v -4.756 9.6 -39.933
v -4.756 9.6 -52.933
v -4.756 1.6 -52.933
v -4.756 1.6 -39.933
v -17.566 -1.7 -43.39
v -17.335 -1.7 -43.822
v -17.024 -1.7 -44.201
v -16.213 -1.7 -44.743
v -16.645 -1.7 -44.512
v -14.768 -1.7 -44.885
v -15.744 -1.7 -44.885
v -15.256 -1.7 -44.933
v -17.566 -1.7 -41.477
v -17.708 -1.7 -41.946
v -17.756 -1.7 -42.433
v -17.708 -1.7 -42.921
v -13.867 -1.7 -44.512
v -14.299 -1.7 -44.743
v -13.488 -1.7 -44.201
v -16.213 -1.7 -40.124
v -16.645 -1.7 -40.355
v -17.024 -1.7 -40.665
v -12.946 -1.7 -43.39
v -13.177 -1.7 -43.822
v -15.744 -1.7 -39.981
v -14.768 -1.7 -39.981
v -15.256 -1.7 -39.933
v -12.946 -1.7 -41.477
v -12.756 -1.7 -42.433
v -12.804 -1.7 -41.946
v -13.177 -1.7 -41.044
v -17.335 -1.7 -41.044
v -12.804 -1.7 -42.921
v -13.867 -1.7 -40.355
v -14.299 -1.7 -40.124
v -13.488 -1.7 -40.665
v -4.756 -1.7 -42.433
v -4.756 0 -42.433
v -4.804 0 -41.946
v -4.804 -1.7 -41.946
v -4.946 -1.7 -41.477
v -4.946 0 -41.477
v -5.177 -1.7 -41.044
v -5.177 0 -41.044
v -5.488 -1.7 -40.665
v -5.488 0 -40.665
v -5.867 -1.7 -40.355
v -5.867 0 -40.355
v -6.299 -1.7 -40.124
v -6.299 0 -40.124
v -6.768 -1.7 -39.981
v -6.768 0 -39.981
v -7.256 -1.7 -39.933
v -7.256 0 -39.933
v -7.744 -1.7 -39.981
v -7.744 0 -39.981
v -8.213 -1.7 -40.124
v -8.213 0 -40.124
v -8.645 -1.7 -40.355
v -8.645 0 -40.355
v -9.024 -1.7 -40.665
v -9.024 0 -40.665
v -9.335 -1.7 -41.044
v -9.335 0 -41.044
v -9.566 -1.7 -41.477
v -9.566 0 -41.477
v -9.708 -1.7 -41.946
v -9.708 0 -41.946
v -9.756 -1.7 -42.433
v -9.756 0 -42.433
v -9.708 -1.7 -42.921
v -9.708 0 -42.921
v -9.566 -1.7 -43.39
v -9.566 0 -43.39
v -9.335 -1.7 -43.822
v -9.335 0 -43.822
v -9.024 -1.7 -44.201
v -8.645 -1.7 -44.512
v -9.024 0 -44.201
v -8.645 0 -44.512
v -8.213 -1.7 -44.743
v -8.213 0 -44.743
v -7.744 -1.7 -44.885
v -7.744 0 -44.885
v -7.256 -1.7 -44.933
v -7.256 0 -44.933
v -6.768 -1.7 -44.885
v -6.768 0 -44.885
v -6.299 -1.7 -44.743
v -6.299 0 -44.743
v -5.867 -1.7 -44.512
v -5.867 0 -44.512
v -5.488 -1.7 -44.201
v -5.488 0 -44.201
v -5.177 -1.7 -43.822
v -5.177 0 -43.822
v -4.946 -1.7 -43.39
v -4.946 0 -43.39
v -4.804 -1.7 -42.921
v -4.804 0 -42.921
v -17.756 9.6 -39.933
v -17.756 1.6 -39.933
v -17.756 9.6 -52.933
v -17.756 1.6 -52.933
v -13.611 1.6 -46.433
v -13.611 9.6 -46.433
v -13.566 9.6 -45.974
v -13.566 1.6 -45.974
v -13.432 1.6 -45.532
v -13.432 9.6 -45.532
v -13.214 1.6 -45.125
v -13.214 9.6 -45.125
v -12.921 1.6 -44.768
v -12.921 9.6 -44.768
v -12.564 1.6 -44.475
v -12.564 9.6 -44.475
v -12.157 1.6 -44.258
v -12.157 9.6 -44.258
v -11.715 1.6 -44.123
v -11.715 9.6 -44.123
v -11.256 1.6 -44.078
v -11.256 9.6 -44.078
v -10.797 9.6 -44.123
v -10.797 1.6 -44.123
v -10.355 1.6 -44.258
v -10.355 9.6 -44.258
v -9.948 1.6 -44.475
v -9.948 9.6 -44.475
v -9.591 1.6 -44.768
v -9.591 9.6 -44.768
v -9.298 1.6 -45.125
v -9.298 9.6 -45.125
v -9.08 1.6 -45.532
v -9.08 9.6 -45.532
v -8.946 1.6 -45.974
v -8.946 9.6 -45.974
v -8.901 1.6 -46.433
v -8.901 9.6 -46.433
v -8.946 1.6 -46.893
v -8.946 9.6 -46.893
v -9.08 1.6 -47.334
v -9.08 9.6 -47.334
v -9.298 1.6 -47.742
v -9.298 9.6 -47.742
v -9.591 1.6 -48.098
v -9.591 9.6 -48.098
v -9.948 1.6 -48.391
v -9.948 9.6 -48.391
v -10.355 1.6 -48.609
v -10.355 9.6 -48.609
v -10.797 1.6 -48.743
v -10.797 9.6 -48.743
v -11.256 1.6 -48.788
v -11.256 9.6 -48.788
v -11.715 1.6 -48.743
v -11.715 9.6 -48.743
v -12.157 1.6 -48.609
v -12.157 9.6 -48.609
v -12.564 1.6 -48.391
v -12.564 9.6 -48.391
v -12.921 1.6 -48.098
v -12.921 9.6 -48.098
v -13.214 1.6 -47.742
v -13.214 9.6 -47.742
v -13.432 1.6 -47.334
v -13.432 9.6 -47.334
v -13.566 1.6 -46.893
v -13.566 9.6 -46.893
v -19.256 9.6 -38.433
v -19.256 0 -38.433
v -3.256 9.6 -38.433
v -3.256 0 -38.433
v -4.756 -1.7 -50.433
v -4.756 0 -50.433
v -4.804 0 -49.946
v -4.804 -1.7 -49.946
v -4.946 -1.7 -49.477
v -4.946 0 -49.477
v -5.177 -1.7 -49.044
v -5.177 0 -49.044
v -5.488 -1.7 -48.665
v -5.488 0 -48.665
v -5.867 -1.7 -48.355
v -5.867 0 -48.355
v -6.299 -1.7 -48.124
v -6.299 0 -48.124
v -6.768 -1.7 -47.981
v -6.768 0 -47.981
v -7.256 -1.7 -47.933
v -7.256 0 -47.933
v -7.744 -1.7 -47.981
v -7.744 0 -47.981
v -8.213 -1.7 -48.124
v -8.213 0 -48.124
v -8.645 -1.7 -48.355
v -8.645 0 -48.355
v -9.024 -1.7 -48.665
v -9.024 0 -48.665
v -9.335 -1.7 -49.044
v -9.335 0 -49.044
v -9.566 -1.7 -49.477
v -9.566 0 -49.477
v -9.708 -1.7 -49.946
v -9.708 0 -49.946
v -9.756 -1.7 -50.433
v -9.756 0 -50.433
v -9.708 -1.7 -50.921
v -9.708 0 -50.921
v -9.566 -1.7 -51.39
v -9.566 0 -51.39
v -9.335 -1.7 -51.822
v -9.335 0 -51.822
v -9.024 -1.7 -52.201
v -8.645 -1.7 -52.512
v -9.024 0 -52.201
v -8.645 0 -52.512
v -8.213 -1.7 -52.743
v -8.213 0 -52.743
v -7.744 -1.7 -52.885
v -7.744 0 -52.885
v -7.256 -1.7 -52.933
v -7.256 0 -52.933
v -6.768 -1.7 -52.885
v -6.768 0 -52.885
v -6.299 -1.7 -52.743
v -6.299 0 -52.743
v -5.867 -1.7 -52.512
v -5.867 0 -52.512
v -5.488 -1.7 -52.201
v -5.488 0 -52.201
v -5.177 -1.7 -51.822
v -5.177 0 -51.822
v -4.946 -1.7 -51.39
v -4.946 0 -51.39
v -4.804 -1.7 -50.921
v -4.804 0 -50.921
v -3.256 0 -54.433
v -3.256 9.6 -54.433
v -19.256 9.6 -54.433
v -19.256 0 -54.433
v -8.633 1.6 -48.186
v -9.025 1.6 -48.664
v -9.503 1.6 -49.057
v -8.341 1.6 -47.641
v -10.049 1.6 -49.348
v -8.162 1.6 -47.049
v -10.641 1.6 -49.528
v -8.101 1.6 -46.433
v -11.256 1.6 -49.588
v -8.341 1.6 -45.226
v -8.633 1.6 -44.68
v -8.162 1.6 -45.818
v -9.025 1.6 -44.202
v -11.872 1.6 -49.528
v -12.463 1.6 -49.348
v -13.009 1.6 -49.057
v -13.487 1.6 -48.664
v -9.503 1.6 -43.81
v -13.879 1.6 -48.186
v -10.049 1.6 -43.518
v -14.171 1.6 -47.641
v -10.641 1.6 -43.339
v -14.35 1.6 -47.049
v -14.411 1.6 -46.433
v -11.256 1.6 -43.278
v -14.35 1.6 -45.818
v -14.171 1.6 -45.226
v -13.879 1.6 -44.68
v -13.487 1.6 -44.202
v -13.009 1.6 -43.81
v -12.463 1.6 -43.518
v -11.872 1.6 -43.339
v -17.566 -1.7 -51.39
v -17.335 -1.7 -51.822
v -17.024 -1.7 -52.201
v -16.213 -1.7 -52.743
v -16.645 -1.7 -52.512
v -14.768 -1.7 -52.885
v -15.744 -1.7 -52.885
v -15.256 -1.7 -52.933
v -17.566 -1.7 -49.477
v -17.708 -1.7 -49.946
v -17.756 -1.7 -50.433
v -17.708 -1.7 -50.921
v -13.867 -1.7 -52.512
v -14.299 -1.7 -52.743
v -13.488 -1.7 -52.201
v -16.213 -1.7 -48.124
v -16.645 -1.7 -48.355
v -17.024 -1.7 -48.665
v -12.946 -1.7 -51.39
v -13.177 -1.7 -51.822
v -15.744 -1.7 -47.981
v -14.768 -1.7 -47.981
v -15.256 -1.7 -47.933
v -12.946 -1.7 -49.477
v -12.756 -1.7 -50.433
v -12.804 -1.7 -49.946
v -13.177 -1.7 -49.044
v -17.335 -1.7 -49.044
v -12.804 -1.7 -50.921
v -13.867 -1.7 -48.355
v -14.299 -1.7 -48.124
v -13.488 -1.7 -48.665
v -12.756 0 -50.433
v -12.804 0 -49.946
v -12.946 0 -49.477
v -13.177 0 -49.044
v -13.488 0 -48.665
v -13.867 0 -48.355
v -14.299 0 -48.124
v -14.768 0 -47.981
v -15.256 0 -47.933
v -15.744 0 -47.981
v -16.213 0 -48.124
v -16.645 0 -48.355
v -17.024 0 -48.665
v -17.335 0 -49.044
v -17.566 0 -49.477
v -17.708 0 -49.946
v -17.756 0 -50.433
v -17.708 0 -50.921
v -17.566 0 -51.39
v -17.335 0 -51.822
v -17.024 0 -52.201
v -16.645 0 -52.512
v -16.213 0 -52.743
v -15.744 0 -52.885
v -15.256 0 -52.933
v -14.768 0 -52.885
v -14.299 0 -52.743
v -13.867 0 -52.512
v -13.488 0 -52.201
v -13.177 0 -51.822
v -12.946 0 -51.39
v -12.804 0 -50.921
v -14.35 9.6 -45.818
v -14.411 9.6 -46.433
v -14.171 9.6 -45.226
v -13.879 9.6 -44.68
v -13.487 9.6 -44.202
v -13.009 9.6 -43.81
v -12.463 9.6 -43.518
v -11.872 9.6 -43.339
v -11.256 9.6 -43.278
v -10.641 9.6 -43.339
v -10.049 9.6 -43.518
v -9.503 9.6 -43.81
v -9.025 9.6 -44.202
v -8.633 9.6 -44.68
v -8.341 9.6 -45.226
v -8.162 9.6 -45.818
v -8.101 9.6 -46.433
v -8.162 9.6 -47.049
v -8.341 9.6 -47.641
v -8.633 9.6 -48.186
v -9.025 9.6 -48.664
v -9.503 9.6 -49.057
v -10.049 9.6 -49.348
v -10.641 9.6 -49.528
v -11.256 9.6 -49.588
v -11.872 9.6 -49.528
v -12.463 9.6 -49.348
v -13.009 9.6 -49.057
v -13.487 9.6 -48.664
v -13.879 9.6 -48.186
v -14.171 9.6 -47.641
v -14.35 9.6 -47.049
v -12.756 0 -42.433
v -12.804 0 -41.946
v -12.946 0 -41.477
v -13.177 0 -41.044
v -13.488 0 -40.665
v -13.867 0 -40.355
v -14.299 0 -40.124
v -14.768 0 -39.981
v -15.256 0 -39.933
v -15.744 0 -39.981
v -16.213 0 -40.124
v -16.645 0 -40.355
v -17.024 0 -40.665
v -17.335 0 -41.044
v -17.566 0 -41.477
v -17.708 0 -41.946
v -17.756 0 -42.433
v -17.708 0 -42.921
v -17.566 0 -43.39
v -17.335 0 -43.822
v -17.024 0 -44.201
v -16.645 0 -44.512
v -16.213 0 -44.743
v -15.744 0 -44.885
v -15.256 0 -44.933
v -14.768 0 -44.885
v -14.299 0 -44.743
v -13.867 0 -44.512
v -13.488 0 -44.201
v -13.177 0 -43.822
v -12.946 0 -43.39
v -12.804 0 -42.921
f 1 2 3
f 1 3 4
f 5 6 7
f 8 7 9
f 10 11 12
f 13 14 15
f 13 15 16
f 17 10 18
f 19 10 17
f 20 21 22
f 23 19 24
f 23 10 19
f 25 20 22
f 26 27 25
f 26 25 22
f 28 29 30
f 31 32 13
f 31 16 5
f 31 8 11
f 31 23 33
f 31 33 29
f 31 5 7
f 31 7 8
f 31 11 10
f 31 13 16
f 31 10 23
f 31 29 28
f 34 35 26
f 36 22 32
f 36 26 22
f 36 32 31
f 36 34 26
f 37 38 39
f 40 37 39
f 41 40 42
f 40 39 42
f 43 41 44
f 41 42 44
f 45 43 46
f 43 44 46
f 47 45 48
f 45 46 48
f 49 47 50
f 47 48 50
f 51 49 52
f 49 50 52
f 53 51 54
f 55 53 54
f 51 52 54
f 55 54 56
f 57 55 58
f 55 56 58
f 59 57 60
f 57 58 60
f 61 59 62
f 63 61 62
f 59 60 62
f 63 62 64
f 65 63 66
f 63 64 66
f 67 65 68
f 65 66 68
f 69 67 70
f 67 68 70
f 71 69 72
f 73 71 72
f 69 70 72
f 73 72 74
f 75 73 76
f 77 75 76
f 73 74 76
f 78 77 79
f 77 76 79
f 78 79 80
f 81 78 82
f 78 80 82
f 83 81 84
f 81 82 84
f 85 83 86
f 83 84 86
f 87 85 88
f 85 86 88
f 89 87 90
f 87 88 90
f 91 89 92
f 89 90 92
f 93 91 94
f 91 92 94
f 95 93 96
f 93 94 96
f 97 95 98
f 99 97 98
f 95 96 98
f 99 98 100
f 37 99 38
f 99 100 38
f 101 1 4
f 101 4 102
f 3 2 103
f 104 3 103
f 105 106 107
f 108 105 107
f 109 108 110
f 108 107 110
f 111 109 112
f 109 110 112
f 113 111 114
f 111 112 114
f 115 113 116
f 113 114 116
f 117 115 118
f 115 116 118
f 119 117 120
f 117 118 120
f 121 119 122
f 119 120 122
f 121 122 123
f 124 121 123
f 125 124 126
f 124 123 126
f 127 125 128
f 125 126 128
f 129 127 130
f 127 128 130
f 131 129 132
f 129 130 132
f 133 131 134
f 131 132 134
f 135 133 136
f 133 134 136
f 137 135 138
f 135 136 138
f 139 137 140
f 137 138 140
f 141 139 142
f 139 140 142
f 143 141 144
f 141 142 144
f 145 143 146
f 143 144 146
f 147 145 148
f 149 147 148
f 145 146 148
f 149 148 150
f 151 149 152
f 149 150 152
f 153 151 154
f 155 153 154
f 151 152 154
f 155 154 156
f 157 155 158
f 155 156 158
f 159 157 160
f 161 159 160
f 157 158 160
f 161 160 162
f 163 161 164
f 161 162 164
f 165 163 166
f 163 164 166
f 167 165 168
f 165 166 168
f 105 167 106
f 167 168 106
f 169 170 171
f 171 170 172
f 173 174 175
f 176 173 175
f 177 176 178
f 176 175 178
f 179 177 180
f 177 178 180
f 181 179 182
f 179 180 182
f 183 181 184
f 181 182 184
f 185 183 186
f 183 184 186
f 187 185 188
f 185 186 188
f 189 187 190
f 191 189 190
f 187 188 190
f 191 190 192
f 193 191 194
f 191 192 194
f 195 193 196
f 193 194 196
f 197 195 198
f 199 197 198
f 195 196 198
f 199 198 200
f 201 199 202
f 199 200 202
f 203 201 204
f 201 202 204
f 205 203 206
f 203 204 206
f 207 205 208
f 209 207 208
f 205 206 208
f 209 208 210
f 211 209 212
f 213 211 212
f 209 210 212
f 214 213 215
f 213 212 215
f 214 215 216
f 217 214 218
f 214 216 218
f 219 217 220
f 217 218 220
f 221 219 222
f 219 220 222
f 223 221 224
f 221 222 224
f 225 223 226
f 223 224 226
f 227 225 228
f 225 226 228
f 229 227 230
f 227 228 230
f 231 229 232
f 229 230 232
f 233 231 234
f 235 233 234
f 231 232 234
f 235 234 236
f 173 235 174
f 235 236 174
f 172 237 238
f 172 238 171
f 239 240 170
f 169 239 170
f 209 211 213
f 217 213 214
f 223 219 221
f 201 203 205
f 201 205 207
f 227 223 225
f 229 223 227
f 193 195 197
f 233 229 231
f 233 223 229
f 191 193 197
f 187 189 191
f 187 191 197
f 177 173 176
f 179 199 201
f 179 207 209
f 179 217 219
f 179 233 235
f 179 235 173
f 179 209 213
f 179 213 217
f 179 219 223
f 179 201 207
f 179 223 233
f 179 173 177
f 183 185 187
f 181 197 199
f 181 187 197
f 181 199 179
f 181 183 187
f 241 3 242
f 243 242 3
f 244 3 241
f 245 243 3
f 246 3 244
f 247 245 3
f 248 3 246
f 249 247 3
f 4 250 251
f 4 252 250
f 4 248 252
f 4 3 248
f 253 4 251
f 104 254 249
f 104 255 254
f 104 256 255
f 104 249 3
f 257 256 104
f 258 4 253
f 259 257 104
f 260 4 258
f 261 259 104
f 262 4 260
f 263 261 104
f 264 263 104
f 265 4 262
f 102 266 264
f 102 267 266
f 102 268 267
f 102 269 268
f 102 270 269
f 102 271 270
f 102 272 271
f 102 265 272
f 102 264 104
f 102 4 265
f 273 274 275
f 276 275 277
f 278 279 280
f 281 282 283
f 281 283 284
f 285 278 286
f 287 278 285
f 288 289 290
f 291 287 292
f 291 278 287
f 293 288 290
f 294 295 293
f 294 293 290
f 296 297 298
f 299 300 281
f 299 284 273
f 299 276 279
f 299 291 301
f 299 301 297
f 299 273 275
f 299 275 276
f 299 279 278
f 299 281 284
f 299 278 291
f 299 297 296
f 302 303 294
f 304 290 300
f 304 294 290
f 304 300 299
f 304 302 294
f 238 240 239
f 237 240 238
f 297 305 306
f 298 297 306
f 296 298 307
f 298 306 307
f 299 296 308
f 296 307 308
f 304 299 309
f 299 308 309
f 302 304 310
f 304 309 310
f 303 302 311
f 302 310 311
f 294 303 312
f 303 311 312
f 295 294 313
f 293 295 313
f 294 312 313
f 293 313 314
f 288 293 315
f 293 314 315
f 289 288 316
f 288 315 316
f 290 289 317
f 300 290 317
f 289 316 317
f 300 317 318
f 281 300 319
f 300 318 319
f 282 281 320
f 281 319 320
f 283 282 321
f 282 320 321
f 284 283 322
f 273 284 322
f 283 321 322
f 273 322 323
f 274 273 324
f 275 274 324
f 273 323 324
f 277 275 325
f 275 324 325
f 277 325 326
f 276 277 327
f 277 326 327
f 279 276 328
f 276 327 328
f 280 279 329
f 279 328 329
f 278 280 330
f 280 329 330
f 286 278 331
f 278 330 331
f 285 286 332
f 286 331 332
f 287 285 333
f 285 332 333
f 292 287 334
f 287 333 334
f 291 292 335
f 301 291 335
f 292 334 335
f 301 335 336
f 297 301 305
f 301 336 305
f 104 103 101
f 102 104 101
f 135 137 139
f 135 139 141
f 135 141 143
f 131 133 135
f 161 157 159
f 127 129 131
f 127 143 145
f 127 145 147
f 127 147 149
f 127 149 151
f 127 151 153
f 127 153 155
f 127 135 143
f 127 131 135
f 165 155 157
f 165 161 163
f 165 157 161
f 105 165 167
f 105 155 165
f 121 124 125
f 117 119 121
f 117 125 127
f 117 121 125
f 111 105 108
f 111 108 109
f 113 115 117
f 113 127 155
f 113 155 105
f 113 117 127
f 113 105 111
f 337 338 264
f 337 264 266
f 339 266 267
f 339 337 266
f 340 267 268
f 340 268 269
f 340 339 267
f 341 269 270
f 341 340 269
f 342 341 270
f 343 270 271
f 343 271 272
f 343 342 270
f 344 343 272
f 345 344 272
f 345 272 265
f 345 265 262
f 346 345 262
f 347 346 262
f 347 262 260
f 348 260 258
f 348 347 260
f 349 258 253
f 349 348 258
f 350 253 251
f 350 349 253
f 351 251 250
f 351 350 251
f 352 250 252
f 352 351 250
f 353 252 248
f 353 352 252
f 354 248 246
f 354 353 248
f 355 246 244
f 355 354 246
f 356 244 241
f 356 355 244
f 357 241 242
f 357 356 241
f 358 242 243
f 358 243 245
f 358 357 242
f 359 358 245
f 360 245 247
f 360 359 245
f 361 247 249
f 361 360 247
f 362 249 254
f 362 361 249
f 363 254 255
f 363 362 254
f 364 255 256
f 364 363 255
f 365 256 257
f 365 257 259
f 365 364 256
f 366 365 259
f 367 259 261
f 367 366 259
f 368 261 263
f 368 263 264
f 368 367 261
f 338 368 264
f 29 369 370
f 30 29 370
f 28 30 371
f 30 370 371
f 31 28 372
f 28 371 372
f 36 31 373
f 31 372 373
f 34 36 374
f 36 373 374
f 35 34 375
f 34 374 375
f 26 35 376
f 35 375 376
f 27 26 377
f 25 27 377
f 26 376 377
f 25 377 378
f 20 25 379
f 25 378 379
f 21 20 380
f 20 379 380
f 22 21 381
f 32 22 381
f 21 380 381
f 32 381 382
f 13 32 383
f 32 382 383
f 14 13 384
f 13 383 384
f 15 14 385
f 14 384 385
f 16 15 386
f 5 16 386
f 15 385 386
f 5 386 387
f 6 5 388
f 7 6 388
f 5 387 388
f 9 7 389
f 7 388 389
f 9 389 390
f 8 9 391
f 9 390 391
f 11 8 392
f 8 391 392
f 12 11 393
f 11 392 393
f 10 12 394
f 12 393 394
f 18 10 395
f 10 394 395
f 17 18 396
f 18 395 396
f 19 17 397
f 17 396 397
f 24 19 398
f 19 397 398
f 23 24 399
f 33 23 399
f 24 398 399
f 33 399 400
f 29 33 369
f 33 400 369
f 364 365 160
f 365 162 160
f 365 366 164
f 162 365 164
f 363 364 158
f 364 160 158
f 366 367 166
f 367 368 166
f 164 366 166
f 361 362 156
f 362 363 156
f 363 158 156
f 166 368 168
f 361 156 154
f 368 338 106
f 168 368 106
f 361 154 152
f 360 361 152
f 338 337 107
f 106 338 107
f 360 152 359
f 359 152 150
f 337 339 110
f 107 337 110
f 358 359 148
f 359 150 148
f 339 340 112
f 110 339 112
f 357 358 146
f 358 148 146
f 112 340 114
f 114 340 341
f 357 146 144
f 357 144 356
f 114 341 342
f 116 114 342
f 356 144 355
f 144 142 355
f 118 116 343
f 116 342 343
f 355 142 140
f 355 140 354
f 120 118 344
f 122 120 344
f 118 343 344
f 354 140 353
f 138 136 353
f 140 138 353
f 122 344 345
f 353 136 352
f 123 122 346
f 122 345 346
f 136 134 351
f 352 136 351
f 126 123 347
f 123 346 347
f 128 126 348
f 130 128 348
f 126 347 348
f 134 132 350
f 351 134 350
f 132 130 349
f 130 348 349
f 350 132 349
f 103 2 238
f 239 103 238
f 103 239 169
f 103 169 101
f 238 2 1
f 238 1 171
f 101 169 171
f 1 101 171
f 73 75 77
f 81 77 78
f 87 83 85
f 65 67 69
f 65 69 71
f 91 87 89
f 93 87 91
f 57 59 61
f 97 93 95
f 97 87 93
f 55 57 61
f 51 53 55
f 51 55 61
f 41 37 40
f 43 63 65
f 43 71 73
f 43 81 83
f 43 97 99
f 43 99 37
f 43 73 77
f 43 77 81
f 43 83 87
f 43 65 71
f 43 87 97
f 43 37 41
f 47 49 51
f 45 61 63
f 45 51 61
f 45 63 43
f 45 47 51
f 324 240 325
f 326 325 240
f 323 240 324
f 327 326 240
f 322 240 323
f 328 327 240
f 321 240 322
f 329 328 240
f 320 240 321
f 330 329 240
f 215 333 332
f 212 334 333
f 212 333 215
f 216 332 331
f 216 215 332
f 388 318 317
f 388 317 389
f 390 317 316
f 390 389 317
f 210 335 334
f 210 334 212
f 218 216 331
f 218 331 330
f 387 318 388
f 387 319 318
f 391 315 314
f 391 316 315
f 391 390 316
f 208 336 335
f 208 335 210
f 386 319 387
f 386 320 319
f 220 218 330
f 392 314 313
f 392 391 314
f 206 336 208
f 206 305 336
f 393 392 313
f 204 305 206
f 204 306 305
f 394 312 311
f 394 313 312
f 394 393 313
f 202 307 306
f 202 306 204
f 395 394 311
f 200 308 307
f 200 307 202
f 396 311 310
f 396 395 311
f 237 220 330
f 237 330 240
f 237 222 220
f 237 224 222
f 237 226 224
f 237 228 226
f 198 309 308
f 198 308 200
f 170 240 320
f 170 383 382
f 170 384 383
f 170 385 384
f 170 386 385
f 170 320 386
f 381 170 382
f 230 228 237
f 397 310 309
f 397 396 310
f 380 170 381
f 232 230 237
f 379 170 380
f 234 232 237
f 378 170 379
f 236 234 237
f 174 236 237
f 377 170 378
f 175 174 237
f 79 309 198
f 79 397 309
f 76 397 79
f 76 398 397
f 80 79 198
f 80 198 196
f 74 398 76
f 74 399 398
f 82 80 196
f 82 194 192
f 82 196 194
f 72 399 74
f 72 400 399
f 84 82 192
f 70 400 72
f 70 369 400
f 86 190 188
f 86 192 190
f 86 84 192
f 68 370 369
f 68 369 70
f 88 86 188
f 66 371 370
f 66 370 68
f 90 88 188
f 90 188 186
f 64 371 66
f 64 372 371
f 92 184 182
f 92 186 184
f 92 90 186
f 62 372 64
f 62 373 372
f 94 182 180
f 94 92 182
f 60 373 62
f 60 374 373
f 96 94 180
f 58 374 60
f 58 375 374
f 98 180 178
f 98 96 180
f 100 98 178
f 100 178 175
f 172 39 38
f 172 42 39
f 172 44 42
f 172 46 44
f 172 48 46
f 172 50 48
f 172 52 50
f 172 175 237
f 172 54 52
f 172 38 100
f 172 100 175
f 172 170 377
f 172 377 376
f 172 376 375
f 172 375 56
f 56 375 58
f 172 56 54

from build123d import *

# Parameters (mm, degrees)
F0_W     = 16
F0_H     = 16
F1_DEPTH = 9.6
F2_R     = 2.5
F3_DEPTH = 1.7
F4_W     = 13
F4_H     = 13
F4_R     = 3.155
F4_R_2   = 2.355
F5_DEPTH = 8


with BuildPart() as f1:
    # F0 (on Front) → F1 (new body)
    with BuildSketch(Plane.XZ):
        with Locations((-11.256055, -46.433249)):
            Rectangle(F0_W, F0_H)
    extrude(amount=-F1_DEPTH)

    # F2 (on face) → F3 (join)
    with BuildSketch(Plane.XZ):
        with Locations((-15.256055, -42.433249)):
            Circle(F2_R)
        with Locations((-15.256055, -50.433249)):
            Circle(F2_R)
        with Locations((-7.256055, -42.433249)):
            Circle(F2_R)
        with Locations((-7.256055, -50.433249)):
            Circle(F2_R)
    extrude(amount=F3_DEPTH)

    # F4 (on face) → F5 (cut)
    with BuildSketch(Plane(origin=(0, 9.6, 0), x_dir=(-1, 0, 0), z_dir=(0, 1, 0))):
        with Locations((11.256055, -46.433249)):
            Rectangle(F4_W, F4_H)
        with Locations((11.256055, -46.433249)):
            Circle(F4_R, mode=Mode.SUBTRACT)
        with Locations((11.256055, -46.433249)):
            Circle(F4_R_2)
    extrude(amount=-F5_DEPTH, mode=Mode.SUBTRACT)


solid = f1.part
